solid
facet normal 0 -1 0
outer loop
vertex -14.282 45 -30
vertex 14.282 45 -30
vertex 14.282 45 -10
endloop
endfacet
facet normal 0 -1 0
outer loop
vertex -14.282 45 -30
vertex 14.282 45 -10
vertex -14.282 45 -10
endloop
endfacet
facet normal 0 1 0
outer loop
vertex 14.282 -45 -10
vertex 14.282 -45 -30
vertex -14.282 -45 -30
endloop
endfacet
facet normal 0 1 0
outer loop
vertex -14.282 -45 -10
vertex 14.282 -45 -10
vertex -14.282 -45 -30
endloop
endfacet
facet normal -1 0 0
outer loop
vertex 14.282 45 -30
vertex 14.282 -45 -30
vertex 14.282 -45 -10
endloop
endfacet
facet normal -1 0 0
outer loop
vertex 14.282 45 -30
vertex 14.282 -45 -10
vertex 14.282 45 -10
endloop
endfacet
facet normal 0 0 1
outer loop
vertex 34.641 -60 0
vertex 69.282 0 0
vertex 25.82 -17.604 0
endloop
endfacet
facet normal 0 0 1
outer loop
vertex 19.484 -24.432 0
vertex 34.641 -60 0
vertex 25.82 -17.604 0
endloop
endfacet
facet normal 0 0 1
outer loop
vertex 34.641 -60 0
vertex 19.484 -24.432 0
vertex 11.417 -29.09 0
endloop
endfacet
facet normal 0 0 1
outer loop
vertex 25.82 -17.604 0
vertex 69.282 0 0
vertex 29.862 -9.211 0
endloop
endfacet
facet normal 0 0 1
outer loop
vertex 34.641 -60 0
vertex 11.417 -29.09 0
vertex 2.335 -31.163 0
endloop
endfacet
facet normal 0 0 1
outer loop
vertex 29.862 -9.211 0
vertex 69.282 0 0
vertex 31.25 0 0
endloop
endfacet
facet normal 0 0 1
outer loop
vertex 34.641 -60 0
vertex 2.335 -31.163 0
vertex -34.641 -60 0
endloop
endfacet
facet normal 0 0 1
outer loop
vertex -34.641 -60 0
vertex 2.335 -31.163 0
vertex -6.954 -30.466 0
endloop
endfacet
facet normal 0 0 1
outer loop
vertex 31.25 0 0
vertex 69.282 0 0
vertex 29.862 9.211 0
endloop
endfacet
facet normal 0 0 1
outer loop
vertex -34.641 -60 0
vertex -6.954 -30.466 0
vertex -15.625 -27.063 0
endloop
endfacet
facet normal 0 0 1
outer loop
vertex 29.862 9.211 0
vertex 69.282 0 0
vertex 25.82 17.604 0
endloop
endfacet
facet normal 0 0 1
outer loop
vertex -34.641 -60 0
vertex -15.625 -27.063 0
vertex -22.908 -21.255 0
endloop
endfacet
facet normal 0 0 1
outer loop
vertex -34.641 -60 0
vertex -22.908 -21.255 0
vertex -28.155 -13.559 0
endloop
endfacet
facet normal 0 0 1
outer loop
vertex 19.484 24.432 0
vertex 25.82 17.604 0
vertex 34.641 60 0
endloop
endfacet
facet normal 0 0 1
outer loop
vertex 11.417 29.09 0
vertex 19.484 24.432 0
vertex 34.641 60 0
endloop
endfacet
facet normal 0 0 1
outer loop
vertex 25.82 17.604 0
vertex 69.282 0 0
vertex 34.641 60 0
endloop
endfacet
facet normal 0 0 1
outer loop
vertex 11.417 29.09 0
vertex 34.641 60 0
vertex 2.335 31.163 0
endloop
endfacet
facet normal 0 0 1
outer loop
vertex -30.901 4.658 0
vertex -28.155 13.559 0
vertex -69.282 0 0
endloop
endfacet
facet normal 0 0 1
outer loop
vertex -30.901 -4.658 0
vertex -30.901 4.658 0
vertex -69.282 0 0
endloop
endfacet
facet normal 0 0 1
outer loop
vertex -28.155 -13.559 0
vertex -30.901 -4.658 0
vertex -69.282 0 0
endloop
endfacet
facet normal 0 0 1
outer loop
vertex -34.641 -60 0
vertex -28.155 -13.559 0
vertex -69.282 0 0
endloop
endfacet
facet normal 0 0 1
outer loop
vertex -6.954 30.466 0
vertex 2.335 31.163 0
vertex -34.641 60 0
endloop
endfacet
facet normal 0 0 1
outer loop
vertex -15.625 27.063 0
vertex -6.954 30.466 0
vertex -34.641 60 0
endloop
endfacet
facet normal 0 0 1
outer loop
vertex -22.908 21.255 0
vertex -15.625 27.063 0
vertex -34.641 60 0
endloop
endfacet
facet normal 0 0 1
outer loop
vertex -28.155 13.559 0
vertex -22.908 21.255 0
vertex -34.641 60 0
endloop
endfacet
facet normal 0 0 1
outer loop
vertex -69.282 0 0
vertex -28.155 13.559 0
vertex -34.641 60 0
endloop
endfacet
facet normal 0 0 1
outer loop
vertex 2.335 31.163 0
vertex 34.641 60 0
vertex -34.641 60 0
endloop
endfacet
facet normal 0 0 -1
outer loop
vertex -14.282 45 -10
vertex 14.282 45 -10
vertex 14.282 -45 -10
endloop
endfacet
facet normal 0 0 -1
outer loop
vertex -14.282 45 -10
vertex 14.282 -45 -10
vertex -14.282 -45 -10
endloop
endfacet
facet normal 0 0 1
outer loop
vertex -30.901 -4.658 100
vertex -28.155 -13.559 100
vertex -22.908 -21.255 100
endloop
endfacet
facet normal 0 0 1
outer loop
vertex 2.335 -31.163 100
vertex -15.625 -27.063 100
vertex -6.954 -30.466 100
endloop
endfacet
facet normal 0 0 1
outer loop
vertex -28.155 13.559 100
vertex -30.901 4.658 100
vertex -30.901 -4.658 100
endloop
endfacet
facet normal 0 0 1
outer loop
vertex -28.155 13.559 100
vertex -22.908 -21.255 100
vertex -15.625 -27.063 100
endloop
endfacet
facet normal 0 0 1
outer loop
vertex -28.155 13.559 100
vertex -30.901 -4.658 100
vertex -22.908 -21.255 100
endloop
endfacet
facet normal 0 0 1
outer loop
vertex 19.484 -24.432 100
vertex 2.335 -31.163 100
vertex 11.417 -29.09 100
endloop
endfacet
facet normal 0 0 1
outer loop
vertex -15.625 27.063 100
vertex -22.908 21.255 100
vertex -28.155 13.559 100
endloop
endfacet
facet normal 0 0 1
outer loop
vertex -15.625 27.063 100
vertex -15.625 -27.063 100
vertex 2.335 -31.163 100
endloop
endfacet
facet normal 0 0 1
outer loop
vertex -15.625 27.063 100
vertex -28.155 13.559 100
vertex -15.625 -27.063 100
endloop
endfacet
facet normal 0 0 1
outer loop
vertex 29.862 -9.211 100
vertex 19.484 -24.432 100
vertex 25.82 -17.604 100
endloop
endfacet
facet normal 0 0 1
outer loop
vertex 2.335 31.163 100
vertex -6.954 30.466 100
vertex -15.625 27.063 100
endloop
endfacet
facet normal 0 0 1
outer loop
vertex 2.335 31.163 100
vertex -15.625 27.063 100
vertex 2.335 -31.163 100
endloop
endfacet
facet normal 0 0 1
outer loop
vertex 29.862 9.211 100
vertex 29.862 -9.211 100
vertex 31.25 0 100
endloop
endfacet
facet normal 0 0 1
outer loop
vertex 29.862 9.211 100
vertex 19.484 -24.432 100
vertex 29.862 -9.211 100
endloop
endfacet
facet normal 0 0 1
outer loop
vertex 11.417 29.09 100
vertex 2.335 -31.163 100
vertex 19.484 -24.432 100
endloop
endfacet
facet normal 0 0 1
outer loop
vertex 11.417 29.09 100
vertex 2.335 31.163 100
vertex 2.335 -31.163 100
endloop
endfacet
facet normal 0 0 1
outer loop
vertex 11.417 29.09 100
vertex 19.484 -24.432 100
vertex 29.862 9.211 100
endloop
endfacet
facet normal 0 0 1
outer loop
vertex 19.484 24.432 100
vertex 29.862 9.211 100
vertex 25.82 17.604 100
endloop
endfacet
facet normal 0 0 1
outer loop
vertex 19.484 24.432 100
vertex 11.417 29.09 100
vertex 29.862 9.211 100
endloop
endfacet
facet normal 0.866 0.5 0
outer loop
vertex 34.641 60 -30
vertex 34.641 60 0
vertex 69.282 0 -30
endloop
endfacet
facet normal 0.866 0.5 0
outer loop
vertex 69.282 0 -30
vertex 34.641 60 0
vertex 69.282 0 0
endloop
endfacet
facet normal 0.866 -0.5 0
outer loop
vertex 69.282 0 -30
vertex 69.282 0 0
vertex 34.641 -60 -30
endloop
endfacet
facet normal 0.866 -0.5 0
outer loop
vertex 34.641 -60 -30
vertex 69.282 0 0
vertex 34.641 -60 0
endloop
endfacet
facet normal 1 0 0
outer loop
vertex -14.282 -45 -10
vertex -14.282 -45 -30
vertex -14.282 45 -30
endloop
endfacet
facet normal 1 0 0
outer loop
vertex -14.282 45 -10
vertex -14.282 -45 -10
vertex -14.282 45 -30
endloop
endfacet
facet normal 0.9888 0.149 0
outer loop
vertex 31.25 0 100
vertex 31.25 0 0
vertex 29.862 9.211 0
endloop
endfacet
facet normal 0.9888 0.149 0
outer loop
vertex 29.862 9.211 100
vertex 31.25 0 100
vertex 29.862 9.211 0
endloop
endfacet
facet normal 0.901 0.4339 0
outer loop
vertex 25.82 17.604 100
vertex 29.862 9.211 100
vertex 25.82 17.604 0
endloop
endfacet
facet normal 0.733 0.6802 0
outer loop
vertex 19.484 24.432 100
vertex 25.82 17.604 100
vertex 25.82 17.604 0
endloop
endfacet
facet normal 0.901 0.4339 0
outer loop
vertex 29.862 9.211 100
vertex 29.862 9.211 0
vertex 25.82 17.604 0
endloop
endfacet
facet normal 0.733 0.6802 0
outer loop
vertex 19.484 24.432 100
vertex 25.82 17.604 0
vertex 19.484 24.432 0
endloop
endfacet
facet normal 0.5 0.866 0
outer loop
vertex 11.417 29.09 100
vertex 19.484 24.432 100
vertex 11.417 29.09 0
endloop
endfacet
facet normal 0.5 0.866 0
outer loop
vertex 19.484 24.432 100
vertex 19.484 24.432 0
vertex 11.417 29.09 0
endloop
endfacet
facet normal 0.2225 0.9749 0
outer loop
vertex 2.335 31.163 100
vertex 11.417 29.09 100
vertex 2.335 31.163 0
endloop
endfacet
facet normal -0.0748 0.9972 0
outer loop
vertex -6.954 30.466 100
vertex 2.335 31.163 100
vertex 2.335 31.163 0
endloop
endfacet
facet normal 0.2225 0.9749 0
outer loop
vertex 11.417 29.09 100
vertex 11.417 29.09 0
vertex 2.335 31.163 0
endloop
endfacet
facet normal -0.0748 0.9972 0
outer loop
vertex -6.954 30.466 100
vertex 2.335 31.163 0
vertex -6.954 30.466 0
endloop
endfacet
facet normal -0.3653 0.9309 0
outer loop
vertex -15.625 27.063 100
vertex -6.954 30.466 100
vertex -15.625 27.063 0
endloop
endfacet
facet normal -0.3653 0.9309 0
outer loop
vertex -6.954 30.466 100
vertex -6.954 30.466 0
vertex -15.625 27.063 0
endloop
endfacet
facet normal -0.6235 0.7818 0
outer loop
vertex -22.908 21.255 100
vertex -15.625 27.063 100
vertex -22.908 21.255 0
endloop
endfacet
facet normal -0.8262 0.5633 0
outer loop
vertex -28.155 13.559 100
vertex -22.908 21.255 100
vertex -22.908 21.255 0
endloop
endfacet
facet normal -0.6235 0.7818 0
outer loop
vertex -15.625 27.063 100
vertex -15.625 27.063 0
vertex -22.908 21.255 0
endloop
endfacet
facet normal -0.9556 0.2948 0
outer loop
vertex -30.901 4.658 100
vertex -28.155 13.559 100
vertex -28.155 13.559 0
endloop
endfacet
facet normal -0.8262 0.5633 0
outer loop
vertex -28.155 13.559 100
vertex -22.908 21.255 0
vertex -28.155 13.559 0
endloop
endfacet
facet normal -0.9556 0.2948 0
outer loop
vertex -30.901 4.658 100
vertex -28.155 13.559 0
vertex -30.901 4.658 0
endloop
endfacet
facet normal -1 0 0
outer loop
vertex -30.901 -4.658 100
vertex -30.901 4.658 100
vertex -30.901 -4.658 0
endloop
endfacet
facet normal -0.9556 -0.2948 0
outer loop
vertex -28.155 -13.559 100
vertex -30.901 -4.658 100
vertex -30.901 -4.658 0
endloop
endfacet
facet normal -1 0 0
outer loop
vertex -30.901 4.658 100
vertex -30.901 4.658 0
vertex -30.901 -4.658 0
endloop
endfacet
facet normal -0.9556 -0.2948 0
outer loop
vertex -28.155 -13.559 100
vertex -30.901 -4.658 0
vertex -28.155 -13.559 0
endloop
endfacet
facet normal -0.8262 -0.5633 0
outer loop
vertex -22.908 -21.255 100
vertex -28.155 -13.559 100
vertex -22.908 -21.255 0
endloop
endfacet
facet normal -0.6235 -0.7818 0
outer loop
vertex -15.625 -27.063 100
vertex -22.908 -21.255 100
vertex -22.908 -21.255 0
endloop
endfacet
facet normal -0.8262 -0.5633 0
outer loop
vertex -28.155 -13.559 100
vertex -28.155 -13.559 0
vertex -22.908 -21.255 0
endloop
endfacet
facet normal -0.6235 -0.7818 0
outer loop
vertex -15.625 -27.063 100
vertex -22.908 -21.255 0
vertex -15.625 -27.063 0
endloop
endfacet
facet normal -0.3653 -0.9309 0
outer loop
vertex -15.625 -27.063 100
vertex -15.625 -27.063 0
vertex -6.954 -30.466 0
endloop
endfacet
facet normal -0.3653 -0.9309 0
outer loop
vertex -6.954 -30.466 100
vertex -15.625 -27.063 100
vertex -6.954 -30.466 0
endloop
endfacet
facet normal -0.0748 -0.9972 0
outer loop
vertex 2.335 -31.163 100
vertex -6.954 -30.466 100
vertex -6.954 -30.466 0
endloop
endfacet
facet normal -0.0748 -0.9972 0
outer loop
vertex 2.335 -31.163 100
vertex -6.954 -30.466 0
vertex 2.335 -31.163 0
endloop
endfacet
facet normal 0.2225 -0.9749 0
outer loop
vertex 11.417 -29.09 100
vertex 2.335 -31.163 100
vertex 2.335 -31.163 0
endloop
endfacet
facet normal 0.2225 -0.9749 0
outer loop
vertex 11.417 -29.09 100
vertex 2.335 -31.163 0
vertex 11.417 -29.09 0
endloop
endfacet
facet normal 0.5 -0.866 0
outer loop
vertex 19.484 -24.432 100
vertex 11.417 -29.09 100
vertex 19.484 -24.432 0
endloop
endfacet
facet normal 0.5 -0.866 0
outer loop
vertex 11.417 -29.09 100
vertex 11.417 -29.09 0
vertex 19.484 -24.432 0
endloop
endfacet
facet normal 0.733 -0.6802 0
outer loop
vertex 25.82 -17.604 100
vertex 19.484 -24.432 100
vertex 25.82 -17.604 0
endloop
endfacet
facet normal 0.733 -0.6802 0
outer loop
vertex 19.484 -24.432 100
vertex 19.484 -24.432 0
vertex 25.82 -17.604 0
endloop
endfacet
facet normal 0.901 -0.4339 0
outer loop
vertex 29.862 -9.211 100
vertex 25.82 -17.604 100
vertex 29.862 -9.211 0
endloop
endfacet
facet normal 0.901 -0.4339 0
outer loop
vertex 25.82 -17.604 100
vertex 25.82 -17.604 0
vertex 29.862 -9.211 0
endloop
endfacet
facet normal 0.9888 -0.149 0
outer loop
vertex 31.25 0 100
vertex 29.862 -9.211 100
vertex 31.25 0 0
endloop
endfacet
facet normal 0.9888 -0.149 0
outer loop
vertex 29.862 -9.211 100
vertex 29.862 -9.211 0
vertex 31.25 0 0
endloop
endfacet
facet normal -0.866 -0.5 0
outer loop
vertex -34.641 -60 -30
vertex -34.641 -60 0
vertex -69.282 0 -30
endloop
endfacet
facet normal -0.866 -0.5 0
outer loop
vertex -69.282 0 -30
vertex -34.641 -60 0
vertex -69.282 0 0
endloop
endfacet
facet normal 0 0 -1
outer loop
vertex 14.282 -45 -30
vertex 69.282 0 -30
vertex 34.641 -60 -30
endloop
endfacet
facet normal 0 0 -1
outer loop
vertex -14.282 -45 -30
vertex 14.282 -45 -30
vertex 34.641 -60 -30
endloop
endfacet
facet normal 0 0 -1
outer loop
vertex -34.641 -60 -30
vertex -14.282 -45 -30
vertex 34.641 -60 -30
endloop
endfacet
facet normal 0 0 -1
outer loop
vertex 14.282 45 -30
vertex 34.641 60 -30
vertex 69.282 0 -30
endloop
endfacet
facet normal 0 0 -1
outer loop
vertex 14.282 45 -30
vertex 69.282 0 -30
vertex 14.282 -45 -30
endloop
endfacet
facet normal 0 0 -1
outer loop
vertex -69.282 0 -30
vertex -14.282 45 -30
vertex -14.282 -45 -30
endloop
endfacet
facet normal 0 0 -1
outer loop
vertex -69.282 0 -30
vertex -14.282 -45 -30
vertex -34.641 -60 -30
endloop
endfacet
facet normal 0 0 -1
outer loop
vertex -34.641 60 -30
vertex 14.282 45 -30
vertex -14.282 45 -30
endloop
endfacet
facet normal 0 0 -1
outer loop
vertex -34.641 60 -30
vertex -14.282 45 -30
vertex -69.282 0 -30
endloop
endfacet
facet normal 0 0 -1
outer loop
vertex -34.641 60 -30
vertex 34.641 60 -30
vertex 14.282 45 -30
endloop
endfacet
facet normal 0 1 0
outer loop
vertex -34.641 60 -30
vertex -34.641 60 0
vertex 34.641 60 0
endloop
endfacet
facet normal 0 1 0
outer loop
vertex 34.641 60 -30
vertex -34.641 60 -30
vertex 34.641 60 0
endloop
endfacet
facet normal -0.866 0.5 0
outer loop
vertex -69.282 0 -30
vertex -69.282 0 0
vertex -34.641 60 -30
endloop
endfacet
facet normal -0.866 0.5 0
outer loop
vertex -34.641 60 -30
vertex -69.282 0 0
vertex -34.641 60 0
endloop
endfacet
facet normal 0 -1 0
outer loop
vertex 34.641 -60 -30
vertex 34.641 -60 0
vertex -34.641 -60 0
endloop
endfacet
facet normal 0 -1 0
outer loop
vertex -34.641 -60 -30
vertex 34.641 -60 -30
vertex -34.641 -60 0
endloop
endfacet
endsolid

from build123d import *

# Parameters (mm, degrees)
SKETCH1_R           = 31.25
BOSS_EXTRUDE1_DEPTH = 100
BOSS_EXTRUDE2_DEPTH = 30
SKETCH3_W           = 28.564064606
SKETCH3_H           = 90
CUT_EXTRUDE1_DEPTH  = 20


with BuildPart() as part:
    # Sketch1 → Boss-Extrude1 (new body)
    with BuildSketch(Plane.XY):
        Circle(SKETCH1_R)
    extrude(amount=BOSS_EXTRUDE1_DEPTH)

    # Sketch2 → Boss-Extrude2 (add)
    with BuildSketch(Plane(origin=(0, 0, 0), x_dir=(-1, 0, 0), z_dir=(0, 0, -1))):
        Polygon((69.282032303, 0), (34.641016151, 60), (-34.641016151, 60), (-69.282032303, 0), (-34.641016151, -60), (34.641016151, -60), align=None)
    extrude(amount=BOSS_EXTRUDE2_DEPTH)

    # Sketch3 → Cut-Extrude1 (cut)
    with BuildSketch(Plane(origin=(0, 0, -30), x_dir=(-1, 0, 0), z_dir=(0, 0, -1))):
        Rectangle(SKETCH3_W, SKETCH3_H)
    extrude(amount=-CUT_EXTRUDE1_DEPTH, mode=Mode.SUBTRACT)


solid = part.part
